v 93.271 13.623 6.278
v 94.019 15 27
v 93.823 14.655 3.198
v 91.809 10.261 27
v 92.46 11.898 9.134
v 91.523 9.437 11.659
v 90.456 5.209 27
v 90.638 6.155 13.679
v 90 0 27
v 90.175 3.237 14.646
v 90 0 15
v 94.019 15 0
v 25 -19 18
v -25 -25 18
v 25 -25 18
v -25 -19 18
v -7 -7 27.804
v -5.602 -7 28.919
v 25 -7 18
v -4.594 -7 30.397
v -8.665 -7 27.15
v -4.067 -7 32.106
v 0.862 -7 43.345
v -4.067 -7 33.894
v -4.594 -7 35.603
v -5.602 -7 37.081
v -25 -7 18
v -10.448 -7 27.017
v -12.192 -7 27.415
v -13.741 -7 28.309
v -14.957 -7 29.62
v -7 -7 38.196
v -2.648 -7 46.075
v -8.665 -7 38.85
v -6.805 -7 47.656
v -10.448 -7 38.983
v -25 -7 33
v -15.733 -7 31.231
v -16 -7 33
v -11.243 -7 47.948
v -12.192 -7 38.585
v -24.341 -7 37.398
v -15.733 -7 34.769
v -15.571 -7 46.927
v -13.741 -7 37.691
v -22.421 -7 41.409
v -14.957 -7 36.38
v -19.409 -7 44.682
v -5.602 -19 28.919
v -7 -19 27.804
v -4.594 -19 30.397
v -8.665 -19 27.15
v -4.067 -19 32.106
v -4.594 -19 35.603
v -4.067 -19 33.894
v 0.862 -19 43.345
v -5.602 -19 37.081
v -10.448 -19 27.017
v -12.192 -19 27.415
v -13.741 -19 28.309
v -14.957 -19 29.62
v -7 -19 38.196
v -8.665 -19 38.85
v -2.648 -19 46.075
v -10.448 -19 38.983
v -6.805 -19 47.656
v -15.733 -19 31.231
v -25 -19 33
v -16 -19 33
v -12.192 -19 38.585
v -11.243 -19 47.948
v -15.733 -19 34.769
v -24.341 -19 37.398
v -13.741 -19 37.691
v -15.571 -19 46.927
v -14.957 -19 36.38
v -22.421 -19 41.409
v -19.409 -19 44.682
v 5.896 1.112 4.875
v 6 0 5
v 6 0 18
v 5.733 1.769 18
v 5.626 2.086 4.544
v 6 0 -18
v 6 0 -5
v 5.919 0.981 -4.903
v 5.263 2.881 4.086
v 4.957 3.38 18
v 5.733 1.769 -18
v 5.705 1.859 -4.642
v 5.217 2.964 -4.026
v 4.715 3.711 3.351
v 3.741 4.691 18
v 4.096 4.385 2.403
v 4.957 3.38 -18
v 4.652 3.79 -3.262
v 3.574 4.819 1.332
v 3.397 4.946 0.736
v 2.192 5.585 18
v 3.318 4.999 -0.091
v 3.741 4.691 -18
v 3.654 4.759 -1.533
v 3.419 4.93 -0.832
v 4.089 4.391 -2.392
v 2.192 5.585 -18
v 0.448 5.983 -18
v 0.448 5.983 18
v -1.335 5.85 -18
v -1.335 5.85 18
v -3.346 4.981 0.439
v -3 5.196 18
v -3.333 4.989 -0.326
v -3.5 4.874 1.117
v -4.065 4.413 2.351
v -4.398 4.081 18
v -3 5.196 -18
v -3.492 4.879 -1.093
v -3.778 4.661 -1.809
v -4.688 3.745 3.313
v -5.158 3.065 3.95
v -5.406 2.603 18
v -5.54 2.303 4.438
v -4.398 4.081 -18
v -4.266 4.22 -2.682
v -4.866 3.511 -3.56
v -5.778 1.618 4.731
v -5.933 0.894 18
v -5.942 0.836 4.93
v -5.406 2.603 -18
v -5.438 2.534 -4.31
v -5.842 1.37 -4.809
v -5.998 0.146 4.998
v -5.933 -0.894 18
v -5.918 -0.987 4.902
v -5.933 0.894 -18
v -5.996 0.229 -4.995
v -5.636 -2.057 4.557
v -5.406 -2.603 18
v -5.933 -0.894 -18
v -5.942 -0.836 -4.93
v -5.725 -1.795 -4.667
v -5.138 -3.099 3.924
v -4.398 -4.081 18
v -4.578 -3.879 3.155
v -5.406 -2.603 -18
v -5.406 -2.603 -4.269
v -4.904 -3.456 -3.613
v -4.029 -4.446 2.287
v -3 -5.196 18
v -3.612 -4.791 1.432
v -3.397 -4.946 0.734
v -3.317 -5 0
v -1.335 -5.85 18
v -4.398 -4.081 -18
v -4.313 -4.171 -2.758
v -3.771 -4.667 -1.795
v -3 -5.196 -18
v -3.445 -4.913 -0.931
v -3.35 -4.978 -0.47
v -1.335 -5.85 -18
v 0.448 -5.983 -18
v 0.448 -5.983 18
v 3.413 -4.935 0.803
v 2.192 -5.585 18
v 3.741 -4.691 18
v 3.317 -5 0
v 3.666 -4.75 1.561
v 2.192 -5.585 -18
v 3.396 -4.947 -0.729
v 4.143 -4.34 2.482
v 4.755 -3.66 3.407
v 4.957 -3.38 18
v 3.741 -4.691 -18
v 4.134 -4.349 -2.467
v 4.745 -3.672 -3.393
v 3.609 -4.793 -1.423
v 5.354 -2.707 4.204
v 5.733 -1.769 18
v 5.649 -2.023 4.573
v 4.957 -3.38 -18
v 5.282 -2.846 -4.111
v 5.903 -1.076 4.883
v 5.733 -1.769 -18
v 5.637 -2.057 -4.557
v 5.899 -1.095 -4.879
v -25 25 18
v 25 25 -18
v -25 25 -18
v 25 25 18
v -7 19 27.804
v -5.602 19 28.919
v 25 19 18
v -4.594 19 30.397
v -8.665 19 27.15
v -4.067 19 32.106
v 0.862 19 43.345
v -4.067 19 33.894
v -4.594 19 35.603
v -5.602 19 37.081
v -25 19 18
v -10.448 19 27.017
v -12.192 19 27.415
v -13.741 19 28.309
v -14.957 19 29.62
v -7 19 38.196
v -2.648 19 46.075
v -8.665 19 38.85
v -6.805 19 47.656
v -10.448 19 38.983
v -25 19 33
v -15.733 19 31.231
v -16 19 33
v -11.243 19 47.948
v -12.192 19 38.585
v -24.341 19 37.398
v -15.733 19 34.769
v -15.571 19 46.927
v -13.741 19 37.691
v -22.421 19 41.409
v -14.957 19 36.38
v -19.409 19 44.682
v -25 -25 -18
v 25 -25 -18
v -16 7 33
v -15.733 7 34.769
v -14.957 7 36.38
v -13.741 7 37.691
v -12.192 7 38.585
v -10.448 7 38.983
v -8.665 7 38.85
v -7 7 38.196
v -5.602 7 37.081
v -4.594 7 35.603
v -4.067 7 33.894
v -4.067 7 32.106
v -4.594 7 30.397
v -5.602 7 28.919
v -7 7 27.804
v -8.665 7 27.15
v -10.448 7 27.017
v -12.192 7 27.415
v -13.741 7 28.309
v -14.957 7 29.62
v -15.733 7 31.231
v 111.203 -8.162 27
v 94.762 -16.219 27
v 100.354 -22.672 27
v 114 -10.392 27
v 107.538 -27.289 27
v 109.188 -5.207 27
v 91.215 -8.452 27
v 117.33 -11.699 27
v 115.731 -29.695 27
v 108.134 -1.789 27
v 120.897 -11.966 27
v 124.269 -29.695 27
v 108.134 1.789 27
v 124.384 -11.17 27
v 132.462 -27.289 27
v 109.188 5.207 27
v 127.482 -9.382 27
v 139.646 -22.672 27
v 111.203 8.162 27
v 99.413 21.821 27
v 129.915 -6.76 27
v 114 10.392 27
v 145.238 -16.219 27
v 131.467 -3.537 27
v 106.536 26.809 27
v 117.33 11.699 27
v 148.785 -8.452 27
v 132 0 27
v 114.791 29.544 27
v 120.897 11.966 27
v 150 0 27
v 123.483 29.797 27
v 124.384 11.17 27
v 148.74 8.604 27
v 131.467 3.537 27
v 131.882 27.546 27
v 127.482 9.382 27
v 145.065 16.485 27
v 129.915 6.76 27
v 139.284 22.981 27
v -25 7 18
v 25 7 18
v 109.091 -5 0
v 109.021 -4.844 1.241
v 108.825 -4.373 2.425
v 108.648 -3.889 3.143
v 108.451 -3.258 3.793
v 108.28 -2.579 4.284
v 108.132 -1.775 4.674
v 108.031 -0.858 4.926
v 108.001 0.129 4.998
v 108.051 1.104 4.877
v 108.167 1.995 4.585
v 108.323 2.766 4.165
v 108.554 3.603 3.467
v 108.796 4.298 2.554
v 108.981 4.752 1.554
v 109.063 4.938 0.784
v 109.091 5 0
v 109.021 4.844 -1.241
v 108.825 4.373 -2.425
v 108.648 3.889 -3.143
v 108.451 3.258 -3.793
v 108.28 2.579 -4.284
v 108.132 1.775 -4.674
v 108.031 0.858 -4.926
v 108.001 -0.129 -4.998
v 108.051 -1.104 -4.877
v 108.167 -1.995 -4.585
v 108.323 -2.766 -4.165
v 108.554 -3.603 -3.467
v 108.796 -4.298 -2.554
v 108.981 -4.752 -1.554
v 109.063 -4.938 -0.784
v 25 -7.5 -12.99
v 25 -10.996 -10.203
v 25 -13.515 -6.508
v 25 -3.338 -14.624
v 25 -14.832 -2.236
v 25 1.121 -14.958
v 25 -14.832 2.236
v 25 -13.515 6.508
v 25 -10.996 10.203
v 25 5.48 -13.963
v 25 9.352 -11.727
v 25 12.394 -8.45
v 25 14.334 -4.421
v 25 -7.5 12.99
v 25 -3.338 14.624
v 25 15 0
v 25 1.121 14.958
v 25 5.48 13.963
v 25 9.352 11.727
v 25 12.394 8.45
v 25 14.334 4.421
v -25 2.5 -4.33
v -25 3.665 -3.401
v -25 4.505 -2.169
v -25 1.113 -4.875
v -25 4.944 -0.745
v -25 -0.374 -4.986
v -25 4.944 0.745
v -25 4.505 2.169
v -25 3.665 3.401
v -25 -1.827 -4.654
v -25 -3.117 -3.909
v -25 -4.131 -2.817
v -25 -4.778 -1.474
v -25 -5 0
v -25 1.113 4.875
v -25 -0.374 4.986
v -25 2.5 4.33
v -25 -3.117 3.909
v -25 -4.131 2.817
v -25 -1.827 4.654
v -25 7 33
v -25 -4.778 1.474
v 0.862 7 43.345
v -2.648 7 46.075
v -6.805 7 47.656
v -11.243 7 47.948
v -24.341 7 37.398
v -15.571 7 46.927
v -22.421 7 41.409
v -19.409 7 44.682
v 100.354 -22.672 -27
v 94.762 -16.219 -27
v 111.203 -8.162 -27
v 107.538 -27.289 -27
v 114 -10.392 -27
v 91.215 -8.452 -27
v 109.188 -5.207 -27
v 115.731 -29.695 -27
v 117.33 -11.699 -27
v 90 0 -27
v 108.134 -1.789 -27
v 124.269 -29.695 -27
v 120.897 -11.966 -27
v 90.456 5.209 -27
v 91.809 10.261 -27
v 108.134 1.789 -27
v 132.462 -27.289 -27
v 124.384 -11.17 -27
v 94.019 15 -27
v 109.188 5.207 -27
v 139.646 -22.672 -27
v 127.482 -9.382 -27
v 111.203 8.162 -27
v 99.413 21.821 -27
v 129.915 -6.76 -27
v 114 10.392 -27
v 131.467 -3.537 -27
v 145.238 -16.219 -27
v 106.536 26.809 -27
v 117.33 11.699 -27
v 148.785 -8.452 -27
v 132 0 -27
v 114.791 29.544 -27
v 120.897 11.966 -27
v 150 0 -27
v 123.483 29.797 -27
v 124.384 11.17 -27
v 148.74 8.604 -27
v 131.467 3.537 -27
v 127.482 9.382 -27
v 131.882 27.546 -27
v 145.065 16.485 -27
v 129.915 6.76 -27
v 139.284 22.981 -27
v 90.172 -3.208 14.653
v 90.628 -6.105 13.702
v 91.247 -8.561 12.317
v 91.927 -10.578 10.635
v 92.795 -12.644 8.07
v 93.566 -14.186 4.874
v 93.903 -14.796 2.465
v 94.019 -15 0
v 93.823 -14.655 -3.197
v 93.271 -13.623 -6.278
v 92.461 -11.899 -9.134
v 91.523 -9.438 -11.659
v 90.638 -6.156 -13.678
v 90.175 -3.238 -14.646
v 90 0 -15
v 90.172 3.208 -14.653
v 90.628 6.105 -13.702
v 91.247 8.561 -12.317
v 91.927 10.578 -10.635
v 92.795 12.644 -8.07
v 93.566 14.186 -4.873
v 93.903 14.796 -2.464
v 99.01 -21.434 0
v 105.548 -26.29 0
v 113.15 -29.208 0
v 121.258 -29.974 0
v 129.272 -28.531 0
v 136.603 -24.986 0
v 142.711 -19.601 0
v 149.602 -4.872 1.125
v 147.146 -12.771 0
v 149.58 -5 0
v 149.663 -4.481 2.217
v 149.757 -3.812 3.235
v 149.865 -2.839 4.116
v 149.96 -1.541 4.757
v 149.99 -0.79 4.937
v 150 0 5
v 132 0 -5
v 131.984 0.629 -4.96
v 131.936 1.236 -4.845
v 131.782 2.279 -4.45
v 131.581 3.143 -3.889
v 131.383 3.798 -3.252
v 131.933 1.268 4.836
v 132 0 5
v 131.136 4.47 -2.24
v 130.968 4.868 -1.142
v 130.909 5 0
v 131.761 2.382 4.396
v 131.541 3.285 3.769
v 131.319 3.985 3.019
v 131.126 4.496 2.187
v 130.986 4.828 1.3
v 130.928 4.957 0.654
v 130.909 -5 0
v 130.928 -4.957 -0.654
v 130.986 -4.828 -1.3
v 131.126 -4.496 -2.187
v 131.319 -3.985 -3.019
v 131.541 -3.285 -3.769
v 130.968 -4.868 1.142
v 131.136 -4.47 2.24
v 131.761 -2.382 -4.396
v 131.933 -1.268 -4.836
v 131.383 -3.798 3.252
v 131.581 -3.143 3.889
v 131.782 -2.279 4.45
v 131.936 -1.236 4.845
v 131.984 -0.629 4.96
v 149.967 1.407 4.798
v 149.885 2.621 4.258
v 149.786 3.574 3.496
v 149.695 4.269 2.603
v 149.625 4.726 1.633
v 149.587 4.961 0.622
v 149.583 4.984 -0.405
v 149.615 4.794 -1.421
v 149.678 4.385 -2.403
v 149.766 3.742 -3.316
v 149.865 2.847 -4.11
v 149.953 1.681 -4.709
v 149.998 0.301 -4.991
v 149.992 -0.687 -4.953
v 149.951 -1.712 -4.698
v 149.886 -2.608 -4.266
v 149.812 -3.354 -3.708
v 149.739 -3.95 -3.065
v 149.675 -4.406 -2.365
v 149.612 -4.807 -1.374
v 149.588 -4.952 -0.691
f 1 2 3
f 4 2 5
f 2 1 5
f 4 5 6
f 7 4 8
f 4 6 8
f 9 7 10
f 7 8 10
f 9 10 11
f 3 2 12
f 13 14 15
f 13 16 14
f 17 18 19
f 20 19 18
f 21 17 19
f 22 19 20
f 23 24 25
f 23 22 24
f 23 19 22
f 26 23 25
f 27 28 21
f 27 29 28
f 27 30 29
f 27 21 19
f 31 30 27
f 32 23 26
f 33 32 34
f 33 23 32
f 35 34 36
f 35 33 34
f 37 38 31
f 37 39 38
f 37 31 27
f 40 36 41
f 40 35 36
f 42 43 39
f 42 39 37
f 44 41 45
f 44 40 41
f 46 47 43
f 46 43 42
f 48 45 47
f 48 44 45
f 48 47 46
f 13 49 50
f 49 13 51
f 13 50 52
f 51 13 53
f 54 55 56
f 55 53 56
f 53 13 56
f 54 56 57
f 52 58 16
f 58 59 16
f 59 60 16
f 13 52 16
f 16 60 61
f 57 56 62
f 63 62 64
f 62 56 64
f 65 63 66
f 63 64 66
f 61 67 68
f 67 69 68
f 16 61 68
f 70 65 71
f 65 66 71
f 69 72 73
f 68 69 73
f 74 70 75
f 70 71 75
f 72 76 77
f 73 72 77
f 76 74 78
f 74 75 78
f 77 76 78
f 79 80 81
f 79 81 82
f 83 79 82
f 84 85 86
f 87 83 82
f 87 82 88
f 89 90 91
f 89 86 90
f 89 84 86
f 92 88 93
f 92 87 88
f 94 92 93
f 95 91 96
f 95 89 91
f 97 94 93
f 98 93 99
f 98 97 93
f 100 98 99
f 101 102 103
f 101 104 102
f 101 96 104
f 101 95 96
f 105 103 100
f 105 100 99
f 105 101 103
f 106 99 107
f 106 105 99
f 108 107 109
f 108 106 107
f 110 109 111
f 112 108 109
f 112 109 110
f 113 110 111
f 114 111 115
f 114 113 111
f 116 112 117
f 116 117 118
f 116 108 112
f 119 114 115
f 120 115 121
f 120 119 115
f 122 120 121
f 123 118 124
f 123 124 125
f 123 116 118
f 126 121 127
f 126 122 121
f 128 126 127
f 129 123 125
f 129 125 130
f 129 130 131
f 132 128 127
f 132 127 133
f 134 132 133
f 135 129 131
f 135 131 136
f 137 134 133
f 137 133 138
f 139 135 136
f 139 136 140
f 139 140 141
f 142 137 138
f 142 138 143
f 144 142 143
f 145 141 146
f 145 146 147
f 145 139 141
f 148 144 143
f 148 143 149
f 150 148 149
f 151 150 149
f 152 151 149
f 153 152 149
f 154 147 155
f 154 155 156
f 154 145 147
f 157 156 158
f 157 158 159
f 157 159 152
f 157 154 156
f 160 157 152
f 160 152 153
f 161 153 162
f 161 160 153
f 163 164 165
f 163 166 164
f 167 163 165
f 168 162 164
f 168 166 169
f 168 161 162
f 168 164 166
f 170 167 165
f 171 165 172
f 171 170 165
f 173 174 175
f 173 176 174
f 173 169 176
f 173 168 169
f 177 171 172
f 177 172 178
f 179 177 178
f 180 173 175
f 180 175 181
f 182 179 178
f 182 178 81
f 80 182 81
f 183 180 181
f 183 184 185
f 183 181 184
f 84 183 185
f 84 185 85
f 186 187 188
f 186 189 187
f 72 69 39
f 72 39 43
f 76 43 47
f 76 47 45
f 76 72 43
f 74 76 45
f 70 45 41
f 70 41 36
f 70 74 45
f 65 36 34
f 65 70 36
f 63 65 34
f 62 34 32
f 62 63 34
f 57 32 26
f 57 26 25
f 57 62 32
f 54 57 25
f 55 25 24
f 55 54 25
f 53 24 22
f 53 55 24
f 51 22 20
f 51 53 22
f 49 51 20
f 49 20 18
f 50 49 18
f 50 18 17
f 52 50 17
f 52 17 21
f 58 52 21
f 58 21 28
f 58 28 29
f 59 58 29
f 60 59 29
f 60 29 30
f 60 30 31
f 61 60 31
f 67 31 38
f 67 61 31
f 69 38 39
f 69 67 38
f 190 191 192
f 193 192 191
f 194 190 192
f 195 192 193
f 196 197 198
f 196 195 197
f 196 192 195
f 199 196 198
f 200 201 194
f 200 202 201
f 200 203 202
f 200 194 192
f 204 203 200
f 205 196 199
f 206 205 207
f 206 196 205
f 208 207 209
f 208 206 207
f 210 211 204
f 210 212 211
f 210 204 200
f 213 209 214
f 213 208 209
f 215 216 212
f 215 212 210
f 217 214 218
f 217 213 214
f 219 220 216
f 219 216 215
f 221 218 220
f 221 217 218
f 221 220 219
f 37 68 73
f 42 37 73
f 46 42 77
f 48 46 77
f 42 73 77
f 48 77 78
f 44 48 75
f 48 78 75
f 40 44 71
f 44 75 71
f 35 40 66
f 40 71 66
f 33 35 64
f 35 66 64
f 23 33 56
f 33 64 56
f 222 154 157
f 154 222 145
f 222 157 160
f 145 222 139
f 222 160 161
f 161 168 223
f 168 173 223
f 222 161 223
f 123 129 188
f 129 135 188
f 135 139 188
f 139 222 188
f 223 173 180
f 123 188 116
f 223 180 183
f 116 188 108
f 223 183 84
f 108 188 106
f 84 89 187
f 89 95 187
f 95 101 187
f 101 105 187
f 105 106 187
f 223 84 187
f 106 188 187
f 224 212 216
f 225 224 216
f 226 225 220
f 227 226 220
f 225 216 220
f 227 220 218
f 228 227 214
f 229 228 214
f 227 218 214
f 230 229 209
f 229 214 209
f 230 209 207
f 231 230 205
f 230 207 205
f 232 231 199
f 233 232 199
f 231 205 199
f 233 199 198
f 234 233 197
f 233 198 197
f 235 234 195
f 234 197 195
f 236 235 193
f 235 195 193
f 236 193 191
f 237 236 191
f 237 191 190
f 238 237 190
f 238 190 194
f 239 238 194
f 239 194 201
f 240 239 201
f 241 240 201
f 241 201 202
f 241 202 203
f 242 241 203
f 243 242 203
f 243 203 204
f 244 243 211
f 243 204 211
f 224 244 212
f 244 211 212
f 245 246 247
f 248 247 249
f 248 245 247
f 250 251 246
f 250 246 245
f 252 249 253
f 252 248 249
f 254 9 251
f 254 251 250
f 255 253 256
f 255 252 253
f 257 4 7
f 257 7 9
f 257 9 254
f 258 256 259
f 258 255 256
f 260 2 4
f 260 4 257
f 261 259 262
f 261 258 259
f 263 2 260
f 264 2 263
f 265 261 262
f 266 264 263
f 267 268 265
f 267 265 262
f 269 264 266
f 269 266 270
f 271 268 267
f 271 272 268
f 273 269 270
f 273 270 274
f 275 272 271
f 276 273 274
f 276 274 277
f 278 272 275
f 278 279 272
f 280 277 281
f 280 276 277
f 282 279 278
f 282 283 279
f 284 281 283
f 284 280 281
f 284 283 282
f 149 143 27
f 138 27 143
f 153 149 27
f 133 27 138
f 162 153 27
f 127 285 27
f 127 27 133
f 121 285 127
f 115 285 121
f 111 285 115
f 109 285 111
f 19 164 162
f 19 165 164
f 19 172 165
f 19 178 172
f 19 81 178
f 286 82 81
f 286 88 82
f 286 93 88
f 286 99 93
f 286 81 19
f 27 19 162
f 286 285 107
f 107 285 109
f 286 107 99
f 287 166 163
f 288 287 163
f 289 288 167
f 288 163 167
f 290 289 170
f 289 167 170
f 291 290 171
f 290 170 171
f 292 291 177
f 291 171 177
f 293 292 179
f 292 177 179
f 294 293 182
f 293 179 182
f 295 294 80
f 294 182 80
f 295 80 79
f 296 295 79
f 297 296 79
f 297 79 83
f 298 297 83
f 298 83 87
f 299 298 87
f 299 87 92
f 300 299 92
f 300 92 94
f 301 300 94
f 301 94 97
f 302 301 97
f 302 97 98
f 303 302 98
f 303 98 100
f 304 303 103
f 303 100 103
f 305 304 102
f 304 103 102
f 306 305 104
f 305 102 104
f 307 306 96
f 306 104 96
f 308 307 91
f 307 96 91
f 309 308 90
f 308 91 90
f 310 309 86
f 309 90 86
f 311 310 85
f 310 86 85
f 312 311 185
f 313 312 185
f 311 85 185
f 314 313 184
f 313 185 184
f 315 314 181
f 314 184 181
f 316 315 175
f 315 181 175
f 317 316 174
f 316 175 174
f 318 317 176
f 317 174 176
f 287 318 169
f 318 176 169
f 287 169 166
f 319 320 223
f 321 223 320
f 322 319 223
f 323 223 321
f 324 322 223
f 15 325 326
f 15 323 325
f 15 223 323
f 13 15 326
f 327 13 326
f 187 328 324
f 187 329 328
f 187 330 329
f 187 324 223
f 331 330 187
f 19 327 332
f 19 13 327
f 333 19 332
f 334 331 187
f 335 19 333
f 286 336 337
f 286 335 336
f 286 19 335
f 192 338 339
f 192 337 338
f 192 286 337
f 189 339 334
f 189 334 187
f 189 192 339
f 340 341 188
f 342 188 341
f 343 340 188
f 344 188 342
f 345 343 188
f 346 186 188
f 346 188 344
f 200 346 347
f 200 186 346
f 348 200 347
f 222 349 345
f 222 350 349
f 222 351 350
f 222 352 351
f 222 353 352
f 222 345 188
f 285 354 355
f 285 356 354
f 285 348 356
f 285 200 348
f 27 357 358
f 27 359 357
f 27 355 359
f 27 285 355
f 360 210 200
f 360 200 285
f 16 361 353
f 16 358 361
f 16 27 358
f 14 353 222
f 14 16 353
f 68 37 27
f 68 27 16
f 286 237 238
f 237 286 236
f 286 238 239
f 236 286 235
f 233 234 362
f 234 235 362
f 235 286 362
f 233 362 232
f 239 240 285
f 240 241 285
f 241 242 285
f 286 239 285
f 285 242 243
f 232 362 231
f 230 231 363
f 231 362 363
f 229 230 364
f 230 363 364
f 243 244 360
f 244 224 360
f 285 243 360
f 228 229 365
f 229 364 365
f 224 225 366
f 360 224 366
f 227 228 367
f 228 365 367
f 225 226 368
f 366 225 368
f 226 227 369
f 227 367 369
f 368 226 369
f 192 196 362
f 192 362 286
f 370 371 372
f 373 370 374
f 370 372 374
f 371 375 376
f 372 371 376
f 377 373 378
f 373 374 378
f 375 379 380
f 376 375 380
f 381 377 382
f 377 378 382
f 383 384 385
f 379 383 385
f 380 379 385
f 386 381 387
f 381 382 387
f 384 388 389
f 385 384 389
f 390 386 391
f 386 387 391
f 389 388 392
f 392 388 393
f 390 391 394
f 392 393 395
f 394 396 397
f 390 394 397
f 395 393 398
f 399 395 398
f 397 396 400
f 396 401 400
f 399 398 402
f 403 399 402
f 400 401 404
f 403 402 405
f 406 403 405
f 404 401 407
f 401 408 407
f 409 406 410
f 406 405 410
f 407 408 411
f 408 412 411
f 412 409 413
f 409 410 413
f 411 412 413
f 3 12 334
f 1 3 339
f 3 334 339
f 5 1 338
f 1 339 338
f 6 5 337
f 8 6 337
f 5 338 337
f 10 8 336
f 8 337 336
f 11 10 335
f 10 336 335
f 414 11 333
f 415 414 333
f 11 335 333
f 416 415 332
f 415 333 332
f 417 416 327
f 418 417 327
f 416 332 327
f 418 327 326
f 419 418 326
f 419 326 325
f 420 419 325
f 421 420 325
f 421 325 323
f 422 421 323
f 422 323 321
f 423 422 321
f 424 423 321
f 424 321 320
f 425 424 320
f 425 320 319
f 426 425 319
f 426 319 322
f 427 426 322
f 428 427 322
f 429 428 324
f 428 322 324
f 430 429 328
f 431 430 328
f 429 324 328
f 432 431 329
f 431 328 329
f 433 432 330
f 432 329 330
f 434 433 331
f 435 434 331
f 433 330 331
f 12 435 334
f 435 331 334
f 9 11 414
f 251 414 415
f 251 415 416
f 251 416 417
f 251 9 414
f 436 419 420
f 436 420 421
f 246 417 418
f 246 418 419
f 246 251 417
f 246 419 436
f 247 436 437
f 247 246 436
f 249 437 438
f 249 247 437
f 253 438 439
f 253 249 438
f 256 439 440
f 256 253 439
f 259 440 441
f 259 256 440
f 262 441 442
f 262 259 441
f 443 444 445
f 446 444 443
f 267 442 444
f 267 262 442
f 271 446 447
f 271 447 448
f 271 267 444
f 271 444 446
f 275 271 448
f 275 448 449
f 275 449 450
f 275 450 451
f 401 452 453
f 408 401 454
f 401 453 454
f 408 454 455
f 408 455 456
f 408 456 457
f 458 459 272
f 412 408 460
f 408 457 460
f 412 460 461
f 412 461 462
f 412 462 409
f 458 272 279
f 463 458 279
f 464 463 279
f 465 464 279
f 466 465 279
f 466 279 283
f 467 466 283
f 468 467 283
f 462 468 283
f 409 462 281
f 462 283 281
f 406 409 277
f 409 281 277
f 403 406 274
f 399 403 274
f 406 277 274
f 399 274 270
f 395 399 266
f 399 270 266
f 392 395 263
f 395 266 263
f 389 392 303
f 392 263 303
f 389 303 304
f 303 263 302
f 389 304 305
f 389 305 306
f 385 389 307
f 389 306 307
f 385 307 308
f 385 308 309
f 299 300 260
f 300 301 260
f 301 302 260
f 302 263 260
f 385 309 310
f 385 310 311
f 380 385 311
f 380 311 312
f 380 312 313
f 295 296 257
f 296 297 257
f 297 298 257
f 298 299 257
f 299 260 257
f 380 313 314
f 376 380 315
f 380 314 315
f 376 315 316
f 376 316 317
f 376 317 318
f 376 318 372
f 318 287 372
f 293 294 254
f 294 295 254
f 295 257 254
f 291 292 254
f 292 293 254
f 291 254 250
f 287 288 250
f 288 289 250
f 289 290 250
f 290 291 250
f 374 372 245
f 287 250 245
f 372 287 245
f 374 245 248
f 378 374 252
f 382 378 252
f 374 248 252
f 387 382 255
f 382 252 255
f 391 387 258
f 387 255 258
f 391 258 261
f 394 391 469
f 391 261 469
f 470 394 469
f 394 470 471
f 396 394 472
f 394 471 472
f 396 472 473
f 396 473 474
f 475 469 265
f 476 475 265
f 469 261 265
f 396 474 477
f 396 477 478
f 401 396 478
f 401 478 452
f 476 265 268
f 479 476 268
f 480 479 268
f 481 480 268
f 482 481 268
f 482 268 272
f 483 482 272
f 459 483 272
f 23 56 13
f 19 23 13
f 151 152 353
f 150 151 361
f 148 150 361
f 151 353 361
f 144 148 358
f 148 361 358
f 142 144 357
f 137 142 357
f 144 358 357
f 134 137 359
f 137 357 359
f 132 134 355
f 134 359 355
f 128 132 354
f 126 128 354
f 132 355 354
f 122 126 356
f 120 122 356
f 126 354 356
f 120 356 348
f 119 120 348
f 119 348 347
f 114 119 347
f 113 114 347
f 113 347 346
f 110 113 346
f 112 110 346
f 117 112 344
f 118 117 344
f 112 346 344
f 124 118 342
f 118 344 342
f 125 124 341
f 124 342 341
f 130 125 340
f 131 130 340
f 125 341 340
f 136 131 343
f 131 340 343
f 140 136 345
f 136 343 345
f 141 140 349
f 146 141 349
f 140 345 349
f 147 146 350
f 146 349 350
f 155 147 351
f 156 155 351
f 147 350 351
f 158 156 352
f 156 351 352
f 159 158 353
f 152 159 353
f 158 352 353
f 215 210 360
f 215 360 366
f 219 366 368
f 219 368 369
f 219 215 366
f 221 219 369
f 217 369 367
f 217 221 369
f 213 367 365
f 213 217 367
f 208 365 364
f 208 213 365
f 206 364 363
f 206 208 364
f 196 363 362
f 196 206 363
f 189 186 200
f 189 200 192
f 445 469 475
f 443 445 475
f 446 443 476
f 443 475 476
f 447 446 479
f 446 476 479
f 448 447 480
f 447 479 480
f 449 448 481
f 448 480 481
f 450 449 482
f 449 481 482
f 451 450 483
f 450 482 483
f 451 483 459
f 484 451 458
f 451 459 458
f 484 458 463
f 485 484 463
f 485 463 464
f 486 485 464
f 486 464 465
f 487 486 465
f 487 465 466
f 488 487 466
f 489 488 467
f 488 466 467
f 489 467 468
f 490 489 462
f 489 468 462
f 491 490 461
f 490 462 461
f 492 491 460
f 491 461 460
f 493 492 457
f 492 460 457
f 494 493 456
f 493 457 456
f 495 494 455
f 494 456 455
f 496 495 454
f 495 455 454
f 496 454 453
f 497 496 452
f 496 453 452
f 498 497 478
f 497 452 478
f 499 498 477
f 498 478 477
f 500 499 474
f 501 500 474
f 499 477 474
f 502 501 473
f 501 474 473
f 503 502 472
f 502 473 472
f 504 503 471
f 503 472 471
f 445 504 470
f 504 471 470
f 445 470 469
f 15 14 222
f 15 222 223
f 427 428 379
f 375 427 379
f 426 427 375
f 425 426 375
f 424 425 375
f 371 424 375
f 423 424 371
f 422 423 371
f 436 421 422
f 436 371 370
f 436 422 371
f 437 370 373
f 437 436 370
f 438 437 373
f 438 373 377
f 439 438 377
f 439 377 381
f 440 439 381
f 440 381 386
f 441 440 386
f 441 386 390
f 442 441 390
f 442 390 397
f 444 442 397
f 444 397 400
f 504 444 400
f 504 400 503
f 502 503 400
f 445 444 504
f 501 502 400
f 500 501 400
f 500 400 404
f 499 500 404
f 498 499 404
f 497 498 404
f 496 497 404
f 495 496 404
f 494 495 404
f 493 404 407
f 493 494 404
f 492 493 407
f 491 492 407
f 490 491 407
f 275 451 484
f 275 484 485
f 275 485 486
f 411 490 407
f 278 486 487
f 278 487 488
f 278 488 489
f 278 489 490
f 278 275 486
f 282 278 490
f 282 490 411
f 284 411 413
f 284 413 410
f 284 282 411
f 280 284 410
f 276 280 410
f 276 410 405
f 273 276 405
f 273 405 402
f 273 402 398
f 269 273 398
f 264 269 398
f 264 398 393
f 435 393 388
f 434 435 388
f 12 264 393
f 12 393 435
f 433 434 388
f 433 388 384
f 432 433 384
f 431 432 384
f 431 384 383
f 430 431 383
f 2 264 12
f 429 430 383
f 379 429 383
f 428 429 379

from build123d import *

# Parameters (mm, degrees)
F0_R     = 6
F1_DEPTH = 18
F0_R_2   = 12
F3_DEPTH = 27
F4_R     = 5
F5_DEPTH = 175.0010001
F7_R     = 6
F8_DEPTH = 12


# Not quite as in the source:
# - a pattern or mirror of a feature is missing from the dataset's text; its kind, count and spacing are read off the source's solid


with BuildPart() as f1:
    # F0 (on Top) → F1 (new body, symmetric)
    with BuildSketch(Plane.XY):
        Polygon((25, 15), (25, 25), (-25, 25), (-25, -25), (25, -25), (25, 0), align=None)
        Circle(F0_R, mode=Mode.SUBTRACT)
    extrude(amount=F1_DEPTH, both=True)

    # F0 (on Top) → F2 (revolve)
    with BuildSketch(Plane.XY):
        with BuildLine():
            Line((94.0192378865, 15), (25, 15))
            Line((25, 15), (25, 0))
            Line((25, 0), (90, 0))
            ThreePointArc((90, 0), (91.0222252113, 7.7645713531), (94.0192378865, 15))
        make_face()
    revolve(axis=Axis((57.5, 0, 0), (1, 0, 0)))

    # F0 (on Top) → F3 (join, symmetric)
    with BuildSketch(Plane.XY):
        with BuildLine():
            ThreePointArc((150, 0), (127.7645713531, 28.9777747887), (94.0192378865, 15))
            ThreePointArc((94.0192378865, 15), (91.0222252113, 7.7645713531), (90, 0))
            ThreePointArc((90, 0), (120, -30), (150, 0))
        make_face()
        with Locations((120, 0)):
            Circle(F0_R_2, mode=Mode.SUBTRACT)
    extrude(amount=F3_DEPTH, both=True)

    # F4 (on face) → F5 (cut, through all)
    with BuildSketch(Plane(origin=(-25, 0, 0), x_dir=(0, -1, 0), z_dir=(-1, 0, 0))):
        Circle(F4_R)
    extrude(amount=-F5_DEPTH, mode=Mode.SUBTRACT)

    # F7 (on offset) → F8 (join)
    with BuildSketch(Plane(origin=(0, 19, 0), x_dir=(-1, 0, 0), z_dir=(0, 1, 0))):
        with BuildLine():
            Line((25, 18), (25, 33))
            ThreePointArc((25, 33), (15.5708601453, 46.9271503633), (-0.8620689655, 43.3448275862))
            Line((-0.8620689655, 43.3448275862), (-25, 18))
            Line((-25, 18), (25, 18))
        make_face()
        with Locations((10, 33)):
            Circle(F7_R, mode=Mode.SUBTRACT)
    f8 = extrude(amount=-F8_DEPTH)

    # F8_copies: F8 across plane
    add(f8.mirror(Plane(origin=(0, 0, 0), x_dir=(0, 0, -1), z_dir=(0, -1, 0))))


solid = f1.part
